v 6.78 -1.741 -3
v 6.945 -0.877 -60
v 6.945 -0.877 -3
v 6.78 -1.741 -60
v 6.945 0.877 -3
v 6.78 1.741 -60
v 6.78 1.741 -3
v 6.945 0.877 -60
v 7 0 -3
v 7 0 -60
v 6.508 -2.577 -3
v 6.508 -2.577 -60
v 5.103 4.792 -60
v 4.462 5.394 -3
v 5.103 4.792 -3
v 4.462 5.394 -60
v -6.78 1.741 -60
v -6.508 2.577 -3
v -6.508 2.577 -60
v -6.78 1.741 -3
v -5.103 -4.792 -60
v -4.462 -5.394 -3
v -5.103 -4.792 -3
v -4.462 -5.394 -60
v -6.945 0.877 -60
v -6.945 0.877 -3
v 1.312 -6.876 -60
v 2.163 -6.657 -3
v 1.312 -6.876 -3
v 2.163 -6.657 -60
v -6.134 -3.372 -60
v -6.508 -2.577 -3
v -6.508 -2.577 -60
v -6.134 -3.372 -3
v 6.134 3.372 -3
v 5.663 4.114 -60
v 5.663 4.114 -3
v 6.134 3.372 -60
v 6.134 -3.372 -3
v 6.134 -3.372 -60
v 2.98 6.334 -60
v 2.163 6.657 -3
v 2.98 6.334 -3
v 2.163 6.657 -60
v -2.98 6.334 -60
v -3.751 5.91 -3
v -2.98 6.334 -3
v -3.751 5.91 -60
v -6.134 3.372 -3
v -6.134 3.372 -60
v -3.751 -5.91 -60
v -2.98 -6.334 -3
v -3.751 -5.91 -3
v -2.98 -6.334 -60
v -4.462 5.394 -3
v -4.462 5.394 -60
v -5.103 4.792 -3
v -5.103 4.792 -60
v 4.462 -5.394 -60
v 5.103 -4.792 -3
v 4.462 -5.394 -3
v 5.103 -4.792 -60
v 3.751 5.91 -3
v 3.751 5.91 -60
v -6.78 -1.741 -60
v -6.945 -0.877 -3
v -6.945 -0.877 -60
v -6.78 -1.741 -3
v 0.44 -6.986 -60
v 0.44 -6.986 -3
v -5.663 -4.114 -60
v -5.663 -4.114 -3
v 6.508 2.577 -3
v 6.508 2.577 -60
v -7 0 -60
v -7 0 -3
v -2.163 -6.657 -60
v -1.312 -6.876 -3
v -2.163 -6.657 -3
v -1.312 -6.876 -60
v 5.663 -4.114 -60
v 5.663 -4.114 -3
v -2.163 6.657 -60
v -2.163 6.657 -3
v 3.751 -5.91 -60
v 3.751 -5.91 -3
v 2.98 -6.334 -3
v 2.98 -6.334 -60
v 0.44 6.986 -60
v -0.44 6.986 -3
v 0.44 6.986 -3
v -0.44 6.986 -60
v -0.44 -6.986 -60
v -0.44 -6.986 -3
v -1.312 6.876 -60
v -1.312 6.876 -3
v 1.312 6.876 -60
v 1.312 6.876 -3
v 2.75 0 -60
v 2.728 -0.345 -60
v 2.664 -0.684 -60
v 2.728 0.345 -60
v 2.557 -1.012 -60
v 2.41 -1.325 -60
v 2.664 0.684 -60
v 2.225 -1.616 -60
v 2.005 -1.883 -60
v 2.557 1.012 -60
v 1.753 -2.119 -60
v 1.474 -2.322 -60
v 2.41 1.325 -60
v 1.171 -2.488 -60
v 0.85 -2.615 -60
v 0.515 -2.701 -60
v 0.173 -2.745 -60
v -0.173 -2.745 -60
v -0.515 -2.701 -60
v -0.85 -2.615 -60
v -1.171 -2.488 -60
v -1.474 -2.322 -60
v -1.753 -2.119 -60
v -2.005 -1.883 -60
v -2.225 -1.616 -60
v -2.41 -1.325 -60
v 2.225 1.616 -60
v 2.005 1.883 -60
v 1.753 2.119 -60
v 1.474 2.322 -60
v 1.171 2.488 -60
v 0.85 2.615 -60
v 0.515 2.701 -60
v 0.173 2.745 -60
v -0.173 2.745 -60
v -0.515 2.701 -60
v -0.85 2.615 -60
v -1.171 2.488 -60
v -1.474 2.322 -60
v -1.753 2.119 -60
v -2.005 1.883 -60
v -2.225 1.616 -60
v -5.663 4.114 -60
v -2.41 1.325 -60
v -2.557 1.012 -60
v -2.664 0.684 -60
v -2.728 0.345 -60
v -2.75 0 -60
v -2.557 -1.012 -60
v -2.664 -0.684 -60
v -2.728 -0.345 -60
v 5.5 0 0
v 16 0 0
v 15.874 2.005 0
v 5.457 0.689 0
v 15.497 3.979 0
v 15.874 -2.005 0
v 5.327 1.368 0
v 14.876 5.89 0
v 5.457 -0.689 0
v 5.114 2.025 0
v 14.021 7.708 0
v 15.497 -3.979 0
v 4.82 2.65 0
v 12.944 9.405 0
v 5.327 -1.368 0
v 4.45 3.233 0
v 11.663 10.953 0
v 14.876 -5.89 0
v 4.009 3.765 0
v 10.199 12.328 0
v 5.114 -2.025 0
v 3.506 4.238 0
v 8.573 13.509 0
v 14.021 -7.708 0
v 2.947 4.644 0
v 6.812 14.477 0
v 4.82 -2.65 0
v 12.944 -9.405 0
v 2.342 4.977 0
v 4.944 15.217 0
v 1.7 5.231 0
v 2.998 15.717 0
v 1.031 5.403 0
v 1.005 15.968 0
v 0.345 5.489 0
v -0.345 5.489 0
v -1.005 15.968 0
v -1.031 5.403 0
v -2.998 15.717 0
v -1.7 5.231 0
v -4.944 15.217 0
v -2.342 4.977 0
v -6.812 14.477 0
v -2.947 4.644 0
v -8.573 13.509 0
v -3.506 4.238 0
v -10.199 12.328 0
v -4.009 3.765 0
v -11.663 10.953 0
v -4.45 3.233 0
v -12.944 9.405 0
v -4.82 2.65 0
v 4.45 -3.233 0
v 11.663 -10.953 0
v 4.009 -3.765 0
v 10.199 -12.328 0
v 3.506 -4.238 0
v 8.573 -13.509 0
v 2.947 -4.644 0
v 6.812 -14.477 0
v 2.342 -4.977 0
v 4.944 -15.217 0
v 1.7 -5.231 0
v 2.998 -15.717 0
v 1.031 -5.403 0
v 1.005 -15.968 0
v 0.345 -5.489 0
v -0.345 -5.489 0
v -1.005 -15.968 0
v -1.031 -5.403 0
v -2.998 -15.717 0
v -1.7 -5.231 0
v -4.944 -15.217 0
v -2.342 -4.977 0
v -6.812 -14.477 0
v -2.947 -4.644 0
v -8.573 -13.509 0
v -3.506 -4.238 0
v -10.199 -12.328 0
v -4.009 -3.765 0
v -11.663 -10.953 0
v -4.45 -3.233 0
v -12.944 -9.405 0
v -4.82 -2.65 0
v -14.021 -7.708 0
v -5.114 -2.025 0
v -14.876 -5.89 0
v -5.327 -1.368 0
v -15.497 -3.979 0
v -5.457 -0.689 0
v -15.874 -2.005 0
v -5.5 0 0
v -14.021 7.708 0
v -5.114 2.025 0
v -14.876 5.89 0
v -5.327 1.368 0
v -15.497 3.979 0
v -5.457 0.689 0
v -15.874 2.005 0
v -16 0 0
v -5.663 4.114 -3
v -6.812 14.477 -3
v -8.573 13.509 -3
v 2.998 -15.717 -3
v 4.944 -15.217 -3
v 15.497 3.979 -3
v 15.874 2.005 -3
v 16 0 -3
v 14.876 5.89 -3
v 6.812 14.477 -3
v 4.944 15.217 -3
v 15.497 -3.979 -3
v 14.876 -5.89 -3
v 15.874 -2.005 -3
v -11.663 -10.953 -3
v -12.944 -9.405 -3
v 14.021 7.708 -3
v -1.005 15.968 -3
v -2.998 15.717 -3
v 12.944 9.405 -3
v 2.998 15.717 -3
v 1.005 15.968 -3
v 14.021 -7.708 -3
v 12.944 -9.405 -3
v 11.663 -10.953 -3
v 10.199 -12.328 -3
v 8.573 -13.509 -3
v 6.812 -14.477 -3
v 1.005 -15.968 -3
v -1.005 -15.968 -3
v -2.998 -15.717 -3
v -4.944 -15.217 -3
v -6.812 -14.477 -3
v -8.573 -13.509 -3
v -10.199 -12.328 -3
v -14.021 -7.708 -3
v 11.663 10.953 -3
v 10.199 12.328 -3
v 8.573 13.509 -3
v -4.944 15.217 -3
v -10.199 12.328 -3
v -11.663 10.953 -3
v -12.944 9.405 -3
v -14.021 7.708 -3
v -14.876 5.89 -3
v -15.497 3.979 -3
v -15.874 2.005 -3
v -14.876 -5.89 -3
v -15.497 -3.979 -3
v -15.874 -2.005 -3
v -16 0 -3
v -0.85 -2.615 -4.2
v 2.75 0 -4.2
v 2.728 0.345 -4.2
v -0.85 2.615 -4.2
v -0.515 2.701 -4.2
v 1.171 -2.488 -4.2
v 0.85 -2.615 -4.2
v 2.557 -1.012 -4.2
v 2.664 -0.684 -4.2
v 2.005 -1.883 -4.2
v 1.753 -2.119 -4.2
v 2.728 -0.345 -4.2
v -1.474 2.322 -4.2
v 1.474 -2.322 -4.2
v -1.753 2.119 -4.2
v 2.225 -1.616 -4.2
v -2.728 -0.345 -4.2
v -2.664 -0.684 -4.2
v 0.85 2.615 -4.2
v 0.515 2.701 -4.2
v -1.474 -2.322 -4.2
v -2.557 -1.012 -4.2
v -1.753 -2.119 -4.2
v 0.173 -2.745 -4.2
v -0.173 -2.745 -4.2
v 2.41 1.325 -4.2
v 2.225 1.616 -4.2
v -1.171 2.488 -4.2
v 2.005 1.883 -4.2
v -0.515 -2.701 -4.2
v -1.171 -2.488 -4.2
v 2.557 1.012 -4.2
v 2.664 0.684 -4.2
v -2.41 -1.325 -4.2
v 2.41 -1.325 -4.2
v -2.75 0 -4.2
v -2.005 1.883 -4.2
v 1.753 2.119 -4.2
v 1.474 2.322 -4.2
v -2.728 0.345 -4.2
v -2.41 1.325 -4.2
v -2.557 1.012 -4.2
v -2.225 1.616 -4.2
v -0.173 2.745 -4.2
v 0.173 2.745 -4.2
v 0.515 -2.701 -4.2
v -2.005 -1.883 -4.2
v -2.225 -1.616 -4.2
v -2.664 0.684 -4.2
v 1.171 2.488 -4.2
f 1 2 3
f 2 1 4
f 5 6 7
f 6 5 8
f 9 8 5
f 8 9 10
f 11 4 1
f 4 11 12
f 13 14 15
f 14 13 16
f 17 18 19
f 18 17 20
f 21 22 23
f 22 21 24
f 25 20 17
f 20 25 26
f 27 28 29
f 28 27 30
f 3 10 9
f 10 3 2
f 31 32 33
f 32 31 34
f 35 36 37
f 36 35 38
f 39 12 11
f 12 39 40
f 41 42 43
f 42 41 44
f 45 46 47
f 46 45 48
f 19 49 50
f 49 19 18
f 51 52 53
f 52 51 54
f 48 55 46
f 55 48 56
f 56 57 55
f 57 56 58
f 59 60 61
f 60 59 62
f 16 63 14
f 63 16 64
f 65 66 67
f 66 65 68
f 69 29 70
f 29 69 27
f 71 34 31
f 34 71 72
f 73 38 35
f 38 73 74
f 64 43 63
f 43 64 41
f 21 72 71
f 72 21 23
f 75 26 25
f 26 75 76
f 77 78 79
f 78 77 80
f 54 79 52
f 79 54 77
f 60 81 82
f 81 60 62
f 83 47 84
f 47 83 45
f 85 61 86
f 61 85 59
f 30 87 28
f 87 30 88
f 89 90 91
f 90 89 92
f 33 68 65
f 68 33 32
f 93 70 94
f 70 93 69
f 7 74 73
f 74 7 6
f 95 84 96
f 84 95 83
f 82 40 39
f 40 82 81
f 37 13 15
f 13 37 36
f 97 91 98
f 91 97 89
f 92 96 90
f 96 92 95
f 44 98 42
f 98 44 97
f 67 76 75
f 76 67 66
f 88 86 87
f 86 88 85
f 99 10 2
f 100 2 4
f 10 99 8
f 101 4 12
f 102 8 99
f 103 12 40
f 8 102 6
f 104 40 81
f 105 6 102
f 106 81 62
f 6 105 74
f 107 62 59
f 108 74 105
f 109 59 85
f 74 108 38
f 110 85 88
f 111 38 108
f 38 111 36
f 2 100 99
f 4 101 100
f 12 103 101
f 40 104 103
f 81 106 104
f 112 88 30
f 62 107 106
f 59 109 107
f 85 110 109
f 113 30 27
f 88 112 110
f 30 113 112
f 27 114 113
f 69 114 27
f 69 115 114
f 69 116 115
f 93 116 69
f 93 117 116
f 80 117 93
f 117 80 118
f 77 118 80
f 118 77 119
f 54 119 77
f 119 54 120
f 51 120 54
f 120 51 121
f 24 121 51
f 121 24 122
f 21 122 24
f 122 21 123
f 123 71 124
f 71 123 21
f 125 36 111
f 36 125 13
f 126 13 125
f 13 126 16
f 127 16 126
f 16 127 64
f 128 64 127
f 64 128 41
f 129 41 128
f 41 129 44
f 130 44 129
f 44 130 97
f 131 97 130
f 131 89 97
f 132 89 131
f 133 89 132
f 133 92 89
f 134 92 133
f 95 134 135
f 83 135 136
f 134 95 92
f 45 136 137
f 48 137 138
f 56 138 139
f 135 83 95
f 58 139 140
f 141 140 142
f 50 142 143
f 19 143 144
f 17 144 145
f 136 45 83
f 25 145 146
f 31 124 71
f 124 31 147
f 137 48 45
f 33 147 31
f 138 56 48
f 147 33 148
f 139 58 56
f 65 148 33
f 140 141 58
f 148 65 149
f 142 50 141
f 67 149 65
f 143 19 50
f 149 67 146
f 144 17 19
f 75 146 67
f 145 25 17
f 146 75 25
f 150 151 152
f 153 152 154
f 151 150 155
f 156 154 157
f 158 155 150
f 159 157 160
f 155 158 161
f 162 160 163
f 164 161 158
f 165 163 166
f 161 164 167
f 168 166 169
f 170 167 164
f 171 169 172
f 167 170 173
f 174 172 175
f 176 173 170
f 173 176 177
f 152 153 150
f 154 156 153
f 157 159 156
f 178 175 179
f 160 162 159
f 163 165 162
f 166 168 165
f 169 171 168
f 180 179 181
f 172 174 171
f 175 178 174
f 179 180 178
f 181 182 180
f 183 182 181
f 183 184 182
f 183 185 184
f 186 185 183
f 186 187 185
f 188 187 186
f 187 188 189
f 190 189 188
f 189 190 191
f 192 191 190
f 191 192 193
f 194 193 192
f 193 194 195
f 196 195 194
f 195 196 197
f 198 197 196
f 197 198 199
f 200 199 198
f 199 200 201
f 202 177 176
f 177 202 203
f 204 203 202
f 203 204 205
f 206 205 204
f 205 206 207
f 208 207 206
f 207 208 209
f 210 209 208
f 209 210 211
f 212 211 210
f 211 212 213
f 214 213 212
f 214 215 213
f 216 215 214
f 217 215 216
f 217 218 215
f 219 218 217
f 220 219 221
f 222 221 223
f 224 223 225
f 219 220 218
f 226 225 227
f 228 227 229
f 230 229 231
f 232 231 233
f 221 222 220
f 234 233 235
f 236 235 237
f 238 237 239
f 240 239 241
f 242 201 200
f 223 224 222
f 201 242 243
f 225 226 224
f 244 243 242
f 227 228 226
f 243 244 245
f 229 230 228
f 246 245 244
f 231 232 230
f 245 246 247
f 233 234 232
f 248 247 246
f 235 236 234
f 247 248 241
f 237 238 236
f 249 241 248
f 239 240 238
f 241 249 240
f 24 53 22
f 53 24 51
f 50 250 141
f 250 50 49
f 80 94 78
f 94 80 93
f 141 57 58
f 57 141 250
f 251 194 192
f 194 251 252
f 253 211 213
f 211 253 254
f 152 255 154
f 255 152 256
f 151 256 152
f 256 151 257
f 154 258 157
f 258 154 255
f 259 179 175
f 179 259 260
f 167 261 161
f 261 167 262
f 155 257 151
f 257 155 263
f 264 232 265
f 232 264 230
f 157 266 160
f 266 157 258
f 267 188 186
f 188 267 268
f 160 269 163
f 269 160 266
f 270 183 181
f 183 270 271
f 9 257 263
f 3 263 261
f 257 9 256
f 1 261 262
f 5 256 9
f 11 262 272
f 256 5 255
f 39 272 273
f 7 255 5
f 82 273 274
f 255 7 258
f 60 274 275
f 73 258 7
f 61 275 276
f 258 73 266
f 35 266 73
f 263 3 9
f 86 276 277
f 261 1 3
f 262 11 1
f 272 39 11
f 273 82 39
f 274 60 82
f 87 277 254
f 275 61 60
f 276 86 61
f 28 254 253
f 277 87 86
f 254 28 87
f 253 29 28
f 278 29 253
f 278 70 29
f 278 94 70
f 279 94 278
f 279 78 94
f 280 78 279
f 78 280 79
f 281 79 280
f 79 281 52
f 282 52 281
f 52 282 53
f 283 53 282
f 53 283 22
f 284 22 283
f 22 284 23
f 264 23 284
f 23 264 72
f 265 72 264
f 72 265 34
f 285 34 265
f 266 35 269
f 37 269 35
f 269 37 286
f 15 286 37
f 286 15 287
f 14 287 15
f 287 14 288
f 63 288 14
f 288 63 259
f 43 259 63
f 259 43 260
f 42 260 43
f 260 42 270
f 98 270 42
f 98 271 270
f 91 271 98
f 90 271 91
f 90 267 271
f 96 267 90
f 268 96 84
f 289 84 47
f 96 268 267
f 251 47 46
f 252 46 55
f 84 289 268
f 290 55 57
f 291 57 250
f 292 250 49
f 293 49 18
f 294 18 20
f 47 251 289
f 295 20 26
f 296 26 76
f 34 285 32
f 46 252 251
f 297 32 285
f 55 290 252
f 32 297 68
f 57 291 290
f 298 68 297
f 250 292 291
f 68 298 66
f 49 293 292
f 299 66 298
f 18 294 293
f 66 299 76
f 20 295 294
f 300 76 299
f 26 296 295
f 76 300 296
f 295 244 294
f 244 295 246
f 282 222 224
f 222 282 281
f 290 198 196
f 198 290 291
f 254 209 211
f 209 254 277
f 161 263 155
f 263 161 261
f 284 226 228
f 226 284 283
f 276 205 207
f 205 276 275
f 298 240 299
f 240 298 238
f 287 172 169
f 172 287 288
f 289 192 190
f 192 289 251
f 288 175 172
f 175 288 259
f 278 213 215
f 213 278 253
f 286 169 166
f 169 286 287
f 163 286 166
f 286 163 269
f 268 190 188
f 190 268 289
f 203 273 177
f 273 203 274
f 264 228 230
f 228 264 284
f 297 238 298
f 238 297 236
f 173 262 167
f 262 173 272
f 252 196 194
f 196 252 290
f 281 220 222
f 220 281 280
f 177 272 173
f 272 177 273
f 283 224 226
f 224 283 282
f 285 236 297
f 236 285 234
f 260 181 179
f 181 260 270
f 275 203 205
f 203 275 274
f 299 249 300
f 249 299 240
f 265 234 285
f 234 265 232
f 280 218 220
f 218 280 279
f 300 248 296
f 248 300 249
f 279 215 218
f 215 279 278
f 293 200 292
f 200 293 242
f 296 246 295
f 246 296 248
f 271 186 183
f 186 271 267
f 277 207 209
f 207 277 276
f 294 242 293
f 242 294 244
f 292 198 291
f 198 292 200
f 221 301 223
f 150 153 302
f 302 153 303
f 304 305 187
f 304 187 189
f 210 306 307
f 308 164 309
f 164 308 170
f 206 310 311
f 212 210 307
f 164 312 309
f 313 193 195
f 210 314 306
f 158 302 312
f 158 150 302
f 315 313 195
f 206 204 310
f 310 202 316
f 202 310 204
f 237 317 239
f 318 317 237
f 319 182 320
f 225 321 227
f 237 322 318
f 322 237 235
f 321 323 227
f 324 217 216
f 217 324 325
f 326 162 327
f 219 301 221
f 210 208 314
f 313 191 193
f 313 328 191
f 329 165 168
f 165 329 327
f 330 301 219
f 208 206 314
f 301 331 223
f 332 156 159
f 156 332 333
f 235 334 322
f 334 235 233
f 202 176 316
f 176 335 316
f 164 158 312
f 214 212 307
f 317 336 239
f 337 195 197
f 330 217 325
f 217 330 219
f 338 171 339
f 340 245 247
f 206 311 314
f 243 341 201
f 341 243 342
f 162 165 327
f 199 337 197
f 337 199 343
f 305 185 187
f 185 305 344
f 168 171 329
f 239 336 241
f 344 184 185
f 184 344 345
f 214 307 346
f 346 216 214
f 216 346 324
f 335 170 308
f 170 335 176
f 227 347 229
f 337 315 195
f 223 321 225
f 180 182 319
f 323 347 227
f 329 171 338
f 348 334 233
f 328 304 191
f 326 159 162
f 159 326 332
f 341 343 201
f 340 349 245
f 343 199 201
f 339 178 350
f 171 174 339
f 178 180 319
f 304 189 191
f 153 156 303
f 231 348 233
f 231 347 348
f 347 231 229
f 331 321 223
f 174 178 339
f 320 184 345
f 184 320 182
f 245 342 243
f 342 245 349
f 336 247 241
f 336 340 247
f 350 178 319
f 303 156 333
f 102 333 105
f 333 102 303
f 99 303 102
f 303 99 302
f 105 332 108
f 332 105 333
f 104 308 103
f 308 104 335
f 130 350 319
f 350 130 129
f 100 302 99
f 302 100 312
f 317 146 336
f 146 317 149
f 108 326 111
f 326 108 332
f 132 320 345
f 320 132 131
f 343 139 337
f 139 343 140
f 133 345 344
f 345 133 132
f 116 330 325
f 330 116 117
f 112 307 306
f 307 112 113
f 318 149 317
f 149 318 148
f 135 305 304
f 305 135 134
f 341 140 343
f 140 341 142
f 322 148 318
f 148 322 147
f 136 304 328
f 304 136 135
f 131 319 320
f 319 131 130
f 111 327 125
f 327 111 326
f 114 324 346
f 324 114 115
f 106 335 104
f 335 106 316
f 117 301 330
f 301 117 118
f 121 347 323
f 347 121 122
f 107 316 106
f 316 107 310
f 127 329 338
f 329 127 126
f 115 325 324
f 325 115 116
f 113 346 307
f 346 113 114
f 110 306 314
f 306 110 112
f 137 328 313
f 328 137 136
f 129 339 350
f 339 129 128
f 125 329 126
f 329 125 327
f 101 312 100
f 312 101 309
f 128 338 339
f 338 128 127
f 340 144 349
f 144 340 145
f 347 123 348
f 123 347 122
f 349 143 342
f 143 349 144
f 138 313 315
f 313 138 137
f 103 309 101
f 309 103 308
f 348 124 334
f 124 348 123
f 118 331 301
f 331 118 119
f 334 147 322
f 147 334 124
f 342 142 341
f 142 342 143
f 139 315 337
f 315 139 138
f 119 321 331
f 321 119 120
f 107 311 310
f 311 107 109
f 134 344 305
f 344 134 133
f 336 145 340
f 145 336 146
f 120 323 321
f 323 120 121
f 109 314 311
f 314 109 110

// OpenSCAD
$fn = 50;


difference() {
	union() {
		translate(v = [0, 0, -60.0000000000]) {
			cylinder(h = 60, r = 7.0000000000);
		}
		translate(v = [0, 0, -3.0000000000]) {
			cylinder(h = 3, r = 16.0000000000);
		}
	}
	union() {
		translate(v = [0, 0, 0]) {
			rotate(a = [0, 0, 0]) {
				difference() {
					union() {
						#translate(v = [0, 0, -60.0000000000]) {
							cylinder(h = 60, r = 2.2500000000);
						}
						#translate(v = [0, 0, -4.2000000000]) {
							cylinder(h = 4.2000000000, r1 = 2.7500000000, r2 = 5.5000000000);
						}
						#translate(v = [0, 0, -60.0000000000]) {
							cylinder(h = 60, r = 2.7500000000);
						}
						#translate(v = [0, 0, -60.0000000000]) {
							cylinder(h = 60, r = 2.2500000000);
						}
					}
					union();
				}
			}
		}
	}
}
